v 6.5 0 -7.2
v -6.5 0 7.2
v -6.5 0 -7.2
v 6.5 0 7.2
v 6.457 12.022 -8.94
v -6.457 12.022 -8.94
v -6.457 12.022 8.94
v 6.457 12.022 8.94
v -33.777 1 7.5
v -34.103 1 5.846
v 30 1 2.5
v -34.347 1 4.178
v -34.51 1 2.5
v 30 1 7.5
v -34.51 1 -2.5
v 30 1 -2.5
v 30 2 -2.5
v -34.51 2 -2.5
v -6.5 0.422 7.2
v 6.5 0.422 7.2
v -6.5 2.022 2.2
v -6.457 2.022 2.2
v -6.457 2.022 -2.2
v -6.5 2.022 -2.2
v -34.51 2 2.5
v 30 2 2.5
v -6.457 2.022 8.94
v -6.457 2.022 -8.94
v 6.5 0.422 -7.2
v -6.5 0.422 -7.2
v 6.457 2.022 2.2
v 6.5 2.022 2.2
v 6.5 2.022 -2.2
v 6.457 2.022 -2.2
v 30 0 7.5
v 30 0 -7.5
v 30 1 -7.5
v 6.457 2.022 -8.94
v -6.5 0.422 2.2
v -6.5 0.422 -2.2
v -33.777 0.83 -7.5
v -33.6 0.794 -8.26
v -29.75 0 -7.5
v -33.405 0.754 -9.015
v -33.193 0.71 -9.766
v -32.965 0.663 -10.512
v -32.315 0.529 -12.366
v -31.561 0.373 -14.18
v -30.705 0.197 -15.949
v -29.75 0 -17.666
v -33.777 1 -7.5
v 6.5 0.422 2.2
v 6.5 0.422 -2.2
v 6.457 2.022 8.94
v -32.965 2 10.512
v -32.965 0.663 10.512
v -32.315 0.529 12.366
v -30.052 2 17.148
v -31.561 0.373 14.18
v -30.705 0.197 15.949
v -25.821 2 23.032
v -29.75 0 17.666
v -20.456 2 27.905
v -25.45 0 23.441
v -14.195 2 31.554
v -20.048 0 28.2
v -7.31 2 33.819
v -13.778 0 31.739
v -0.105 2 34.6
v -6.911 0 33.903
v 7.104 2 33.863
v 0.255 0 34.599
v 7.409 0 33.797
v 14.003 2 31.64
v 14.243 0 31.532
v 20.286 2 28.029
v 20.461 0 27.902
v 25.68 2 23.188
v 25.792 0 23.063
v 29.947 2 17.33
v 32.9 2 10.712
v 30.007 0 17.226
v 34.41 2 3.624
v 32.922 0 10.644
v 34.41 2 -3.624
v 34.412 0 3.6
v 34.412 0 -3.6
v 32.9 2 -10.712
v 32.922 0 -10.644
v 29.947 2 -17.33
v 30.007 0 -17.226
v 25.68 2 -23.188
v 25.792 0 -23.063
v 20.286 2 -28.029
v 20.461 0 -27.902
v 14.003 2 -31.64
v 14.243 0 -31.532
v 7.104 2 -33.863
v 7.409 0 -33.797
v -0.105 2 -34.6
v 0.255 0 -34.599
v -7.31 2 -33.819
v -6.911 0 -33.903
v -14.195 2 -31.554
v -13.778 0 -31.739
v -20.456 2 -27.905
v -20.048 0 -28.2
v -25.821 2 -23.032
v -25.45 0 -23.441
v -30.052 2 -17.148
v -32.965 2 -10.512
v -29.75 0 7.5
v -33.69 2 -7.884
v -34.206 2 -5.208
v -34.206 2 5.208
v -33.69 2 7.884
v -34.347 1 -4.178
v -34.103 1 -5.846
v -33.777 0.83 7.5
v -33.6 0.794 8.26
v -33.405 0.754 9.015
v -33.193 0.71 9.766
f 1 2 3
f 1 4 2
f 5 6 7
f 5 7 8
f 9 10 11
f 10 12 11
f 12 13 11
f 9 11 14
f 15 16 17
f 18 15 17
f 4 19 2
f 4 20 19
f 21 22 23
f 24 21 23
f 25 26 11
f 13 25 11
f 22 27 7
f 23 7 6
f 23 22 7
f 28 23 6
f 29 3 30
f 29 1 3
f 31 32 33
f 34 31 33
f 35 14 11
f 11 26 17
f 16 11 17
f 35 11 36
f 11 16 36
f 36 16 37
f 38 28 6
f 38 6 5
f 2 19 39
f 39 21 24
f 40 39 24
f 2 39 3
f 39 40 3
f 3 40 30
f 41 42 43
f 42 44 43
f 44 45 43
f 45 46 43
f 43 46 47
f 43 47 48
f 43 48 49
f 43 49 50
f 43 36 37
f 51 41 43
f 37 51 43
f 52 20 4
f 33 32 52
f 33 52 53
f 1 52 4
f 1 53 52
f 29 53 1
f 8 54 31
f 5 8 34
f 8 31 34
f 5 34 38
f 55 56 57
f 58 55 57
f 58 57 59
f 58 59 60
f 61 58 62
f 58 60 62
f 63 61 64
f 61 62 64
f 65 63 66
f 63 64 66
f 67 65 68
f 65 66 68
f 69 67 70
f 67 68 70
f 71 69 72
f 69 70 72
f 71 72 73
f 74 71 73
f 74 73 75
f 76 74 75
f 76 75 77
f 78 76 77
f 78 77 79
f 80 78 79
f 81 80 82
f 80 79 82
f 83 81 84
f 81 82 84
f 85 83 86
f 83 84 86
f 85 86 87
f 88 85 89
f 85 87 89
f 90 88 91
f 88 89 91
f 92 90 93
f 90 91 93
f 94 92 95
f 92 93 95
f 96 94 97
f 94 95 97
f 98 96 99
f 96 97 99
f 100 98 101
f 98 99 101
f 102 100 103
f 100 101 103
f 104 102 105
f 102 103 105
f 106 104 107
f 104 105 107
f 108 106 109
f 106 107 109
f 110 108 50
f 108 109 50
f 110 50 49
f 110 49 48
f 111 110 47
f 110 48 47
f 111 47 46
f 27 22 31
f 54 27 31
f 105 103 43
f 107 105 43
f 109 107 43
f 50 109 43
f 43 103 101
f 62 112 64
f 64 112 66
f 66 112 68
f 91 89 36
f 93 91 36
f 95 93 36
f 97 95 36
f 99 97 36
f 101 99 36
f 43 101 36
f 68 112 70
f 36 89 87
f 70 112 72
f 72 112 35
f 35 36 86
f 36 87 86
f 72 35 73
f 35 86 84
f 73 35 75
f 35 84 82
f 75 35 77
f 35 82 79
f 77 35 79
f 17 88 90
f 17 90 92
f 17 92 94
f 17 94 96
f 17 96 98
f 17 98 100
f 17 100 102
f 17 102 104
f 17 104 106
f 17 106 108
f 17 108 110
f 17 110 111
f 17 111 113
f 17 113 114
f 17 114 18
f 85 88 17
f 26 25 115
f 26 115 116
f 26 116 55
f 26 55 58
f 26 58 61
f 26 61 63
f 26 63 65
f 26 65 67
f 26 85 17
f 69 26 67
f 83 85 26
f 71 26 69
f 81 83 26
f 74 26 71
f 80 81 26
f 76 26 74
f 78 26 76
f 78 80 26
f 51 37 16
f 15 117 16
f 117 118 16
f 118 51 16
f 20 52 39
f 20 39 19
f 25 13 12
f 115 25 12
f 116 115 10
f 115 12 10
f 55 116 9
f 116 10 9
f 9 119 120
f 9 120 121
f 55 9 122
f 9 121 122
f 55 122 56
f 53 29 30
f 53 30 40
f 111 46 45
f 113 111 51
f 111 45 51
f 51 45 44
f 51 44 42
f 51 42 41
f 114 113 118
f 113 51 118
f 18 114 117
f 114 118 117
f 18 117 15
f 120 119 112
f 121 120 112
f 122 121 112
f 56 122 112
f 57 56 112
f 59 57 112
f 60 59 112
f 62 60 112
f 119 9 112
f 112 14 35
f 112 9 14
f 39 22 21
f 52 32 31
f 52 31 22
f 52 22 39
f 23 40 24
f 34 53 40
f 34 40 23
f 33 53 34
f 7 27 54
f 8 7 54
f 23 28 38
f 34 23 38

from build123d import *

# Parameters (mm, degrees)
SKETCH1_R                = 34.6
BOSS_EXTRUDE1_DEPTH      = 2
CUT_EXTRUDE4_DEPTH       = 22
CUT_EXTRUDE4_DEPTH_BACK  = 21
CUT_EXTRUDE8_DEPTH       = 30
CUT_EXTRUDE8_DEPTH_BACK  = 38
SKETCH23_W               = 4.4
SKETCH23_H               = 0.6
BOSS_EXTRUDE7_DEPTH      = 6.5
BOSS_EXTRUDE7_DEPTH_BACK = 6.5
SKETCH112_W              = 12.913625174
SKETCH112_H              = 17.880404088
BOSS_EXTRUDE9_DEPTH      = 10


with BuildPart() as part:
    # Sketch1 → Boss-Extrude1 (new body)
    with BuildSketch(Plane(origin=(0, 0, 0), x_dir=(1, 0, 0), z_dir=(0, 1, 0))):
        with Locations(Location((0, 0, 0), (0, 0, 270))):
            Circle(SKETCH1_R)
        Polygon((2.854751228, -2.25), (0, 5.743303437), (-2.854751228, -2.25), align=None, mode=Mode.SUBTRACT)
        Polygon((-2.854751228, -2.25), (2.854751228, -2.25), (0, 5.743303437), align=None)
        with BuildLine():
            Line((-32.964631098, -10.511569654), (-32.964631098, 10.511569654))
            ThreePointArc((-32.964631098, 10.511569654), (-34.6, 0), (-32.964631098, -10.511569654))
        make_face()
    extrude(amount=BOSS_EXTRUDE1_DEPTH)

    # Sketch7 → Cut-Extrude4 (cut, two sides)
    with BuildSketch(Plane.XY) as cut_extrude4_sk:
        Polygon((-34.6, 1), (-29.75, 0), (-34.6, 0), align=None)
    extrude(amount=CUT_EXTRUDE4_DEPTH, mode=Mode.SUBTRACT)
    extrude(cut_extrude4_sk.sketch, amount=-CUT_EXTRUDE4_DEPTH_BACK, mode=Mode.SUBTRACT)

    # Sketch22 → Cut-Extrude8 (cut, two sides)
    with BuildSketch(Plane(origin=(0, 0, 0), x_dir=(0, 0, -1), z_dir=(1, 0, 0))) as cut_extrude8_sk:
        Polygon((-2.5, 2), (-2.5, 1), (-7.5, 1), (-7.5, 0), (7.5, 0), (7.5, 1), (2.5, 1), (2.5, 2), align=None)
    extrude(amount=CUT_EXTRUDE8_DEPTH, mode=Mode.SUBTRACT)
    extrude(cut_extrude8_sk.sketch, amount=-CUT_EXTRUDE8_DEPTH_BACK, mode=Mode.SUBTRACT)


with BuildPart() as body_2:
    # Sketch23 → Boss-Extrude7 (new, two sides)
    with BuildSketch(Plane(origin=(0, 0, 0), x_dir=(0, 0, -1), z_dir=(1, 0, 0))) as boss_extrude7_sk:
        Polygon((7.2, 0), (7.2, 0.421640963), (2.2, 0.421640963), (2.2, 1.421640963), (-2.2, 1.421640963), (-2.2, 0.421640963), (-7.2, 0.421640963), (-7.2, 0), align=None)
        with Locations((0, 1.721640963)):
            Rectangle(SKETCH23_W, SKETCH23_H)
    extrude(amount=BOSS_EXTRUDE7_DEPTH)
    extrude(boss_extrude7_sk.sketch, amount=-BOSS_EXTRUDE7_DEPTH_BACK)

    # Sketch112 → Boss-Extrude9 (add)
    with BuildSketch(Plane(origin=(0, 2.021640963, 0), x_dir=(1, 0, 0), z_dir=(0, 1, 0))):
        Rectangle(SKETCH112_W, SKETCH112_H)
    extrude(amount=BOSS_EXTRUDE9_DEPTH)


solid = Compound([part.part, body_2.part])
